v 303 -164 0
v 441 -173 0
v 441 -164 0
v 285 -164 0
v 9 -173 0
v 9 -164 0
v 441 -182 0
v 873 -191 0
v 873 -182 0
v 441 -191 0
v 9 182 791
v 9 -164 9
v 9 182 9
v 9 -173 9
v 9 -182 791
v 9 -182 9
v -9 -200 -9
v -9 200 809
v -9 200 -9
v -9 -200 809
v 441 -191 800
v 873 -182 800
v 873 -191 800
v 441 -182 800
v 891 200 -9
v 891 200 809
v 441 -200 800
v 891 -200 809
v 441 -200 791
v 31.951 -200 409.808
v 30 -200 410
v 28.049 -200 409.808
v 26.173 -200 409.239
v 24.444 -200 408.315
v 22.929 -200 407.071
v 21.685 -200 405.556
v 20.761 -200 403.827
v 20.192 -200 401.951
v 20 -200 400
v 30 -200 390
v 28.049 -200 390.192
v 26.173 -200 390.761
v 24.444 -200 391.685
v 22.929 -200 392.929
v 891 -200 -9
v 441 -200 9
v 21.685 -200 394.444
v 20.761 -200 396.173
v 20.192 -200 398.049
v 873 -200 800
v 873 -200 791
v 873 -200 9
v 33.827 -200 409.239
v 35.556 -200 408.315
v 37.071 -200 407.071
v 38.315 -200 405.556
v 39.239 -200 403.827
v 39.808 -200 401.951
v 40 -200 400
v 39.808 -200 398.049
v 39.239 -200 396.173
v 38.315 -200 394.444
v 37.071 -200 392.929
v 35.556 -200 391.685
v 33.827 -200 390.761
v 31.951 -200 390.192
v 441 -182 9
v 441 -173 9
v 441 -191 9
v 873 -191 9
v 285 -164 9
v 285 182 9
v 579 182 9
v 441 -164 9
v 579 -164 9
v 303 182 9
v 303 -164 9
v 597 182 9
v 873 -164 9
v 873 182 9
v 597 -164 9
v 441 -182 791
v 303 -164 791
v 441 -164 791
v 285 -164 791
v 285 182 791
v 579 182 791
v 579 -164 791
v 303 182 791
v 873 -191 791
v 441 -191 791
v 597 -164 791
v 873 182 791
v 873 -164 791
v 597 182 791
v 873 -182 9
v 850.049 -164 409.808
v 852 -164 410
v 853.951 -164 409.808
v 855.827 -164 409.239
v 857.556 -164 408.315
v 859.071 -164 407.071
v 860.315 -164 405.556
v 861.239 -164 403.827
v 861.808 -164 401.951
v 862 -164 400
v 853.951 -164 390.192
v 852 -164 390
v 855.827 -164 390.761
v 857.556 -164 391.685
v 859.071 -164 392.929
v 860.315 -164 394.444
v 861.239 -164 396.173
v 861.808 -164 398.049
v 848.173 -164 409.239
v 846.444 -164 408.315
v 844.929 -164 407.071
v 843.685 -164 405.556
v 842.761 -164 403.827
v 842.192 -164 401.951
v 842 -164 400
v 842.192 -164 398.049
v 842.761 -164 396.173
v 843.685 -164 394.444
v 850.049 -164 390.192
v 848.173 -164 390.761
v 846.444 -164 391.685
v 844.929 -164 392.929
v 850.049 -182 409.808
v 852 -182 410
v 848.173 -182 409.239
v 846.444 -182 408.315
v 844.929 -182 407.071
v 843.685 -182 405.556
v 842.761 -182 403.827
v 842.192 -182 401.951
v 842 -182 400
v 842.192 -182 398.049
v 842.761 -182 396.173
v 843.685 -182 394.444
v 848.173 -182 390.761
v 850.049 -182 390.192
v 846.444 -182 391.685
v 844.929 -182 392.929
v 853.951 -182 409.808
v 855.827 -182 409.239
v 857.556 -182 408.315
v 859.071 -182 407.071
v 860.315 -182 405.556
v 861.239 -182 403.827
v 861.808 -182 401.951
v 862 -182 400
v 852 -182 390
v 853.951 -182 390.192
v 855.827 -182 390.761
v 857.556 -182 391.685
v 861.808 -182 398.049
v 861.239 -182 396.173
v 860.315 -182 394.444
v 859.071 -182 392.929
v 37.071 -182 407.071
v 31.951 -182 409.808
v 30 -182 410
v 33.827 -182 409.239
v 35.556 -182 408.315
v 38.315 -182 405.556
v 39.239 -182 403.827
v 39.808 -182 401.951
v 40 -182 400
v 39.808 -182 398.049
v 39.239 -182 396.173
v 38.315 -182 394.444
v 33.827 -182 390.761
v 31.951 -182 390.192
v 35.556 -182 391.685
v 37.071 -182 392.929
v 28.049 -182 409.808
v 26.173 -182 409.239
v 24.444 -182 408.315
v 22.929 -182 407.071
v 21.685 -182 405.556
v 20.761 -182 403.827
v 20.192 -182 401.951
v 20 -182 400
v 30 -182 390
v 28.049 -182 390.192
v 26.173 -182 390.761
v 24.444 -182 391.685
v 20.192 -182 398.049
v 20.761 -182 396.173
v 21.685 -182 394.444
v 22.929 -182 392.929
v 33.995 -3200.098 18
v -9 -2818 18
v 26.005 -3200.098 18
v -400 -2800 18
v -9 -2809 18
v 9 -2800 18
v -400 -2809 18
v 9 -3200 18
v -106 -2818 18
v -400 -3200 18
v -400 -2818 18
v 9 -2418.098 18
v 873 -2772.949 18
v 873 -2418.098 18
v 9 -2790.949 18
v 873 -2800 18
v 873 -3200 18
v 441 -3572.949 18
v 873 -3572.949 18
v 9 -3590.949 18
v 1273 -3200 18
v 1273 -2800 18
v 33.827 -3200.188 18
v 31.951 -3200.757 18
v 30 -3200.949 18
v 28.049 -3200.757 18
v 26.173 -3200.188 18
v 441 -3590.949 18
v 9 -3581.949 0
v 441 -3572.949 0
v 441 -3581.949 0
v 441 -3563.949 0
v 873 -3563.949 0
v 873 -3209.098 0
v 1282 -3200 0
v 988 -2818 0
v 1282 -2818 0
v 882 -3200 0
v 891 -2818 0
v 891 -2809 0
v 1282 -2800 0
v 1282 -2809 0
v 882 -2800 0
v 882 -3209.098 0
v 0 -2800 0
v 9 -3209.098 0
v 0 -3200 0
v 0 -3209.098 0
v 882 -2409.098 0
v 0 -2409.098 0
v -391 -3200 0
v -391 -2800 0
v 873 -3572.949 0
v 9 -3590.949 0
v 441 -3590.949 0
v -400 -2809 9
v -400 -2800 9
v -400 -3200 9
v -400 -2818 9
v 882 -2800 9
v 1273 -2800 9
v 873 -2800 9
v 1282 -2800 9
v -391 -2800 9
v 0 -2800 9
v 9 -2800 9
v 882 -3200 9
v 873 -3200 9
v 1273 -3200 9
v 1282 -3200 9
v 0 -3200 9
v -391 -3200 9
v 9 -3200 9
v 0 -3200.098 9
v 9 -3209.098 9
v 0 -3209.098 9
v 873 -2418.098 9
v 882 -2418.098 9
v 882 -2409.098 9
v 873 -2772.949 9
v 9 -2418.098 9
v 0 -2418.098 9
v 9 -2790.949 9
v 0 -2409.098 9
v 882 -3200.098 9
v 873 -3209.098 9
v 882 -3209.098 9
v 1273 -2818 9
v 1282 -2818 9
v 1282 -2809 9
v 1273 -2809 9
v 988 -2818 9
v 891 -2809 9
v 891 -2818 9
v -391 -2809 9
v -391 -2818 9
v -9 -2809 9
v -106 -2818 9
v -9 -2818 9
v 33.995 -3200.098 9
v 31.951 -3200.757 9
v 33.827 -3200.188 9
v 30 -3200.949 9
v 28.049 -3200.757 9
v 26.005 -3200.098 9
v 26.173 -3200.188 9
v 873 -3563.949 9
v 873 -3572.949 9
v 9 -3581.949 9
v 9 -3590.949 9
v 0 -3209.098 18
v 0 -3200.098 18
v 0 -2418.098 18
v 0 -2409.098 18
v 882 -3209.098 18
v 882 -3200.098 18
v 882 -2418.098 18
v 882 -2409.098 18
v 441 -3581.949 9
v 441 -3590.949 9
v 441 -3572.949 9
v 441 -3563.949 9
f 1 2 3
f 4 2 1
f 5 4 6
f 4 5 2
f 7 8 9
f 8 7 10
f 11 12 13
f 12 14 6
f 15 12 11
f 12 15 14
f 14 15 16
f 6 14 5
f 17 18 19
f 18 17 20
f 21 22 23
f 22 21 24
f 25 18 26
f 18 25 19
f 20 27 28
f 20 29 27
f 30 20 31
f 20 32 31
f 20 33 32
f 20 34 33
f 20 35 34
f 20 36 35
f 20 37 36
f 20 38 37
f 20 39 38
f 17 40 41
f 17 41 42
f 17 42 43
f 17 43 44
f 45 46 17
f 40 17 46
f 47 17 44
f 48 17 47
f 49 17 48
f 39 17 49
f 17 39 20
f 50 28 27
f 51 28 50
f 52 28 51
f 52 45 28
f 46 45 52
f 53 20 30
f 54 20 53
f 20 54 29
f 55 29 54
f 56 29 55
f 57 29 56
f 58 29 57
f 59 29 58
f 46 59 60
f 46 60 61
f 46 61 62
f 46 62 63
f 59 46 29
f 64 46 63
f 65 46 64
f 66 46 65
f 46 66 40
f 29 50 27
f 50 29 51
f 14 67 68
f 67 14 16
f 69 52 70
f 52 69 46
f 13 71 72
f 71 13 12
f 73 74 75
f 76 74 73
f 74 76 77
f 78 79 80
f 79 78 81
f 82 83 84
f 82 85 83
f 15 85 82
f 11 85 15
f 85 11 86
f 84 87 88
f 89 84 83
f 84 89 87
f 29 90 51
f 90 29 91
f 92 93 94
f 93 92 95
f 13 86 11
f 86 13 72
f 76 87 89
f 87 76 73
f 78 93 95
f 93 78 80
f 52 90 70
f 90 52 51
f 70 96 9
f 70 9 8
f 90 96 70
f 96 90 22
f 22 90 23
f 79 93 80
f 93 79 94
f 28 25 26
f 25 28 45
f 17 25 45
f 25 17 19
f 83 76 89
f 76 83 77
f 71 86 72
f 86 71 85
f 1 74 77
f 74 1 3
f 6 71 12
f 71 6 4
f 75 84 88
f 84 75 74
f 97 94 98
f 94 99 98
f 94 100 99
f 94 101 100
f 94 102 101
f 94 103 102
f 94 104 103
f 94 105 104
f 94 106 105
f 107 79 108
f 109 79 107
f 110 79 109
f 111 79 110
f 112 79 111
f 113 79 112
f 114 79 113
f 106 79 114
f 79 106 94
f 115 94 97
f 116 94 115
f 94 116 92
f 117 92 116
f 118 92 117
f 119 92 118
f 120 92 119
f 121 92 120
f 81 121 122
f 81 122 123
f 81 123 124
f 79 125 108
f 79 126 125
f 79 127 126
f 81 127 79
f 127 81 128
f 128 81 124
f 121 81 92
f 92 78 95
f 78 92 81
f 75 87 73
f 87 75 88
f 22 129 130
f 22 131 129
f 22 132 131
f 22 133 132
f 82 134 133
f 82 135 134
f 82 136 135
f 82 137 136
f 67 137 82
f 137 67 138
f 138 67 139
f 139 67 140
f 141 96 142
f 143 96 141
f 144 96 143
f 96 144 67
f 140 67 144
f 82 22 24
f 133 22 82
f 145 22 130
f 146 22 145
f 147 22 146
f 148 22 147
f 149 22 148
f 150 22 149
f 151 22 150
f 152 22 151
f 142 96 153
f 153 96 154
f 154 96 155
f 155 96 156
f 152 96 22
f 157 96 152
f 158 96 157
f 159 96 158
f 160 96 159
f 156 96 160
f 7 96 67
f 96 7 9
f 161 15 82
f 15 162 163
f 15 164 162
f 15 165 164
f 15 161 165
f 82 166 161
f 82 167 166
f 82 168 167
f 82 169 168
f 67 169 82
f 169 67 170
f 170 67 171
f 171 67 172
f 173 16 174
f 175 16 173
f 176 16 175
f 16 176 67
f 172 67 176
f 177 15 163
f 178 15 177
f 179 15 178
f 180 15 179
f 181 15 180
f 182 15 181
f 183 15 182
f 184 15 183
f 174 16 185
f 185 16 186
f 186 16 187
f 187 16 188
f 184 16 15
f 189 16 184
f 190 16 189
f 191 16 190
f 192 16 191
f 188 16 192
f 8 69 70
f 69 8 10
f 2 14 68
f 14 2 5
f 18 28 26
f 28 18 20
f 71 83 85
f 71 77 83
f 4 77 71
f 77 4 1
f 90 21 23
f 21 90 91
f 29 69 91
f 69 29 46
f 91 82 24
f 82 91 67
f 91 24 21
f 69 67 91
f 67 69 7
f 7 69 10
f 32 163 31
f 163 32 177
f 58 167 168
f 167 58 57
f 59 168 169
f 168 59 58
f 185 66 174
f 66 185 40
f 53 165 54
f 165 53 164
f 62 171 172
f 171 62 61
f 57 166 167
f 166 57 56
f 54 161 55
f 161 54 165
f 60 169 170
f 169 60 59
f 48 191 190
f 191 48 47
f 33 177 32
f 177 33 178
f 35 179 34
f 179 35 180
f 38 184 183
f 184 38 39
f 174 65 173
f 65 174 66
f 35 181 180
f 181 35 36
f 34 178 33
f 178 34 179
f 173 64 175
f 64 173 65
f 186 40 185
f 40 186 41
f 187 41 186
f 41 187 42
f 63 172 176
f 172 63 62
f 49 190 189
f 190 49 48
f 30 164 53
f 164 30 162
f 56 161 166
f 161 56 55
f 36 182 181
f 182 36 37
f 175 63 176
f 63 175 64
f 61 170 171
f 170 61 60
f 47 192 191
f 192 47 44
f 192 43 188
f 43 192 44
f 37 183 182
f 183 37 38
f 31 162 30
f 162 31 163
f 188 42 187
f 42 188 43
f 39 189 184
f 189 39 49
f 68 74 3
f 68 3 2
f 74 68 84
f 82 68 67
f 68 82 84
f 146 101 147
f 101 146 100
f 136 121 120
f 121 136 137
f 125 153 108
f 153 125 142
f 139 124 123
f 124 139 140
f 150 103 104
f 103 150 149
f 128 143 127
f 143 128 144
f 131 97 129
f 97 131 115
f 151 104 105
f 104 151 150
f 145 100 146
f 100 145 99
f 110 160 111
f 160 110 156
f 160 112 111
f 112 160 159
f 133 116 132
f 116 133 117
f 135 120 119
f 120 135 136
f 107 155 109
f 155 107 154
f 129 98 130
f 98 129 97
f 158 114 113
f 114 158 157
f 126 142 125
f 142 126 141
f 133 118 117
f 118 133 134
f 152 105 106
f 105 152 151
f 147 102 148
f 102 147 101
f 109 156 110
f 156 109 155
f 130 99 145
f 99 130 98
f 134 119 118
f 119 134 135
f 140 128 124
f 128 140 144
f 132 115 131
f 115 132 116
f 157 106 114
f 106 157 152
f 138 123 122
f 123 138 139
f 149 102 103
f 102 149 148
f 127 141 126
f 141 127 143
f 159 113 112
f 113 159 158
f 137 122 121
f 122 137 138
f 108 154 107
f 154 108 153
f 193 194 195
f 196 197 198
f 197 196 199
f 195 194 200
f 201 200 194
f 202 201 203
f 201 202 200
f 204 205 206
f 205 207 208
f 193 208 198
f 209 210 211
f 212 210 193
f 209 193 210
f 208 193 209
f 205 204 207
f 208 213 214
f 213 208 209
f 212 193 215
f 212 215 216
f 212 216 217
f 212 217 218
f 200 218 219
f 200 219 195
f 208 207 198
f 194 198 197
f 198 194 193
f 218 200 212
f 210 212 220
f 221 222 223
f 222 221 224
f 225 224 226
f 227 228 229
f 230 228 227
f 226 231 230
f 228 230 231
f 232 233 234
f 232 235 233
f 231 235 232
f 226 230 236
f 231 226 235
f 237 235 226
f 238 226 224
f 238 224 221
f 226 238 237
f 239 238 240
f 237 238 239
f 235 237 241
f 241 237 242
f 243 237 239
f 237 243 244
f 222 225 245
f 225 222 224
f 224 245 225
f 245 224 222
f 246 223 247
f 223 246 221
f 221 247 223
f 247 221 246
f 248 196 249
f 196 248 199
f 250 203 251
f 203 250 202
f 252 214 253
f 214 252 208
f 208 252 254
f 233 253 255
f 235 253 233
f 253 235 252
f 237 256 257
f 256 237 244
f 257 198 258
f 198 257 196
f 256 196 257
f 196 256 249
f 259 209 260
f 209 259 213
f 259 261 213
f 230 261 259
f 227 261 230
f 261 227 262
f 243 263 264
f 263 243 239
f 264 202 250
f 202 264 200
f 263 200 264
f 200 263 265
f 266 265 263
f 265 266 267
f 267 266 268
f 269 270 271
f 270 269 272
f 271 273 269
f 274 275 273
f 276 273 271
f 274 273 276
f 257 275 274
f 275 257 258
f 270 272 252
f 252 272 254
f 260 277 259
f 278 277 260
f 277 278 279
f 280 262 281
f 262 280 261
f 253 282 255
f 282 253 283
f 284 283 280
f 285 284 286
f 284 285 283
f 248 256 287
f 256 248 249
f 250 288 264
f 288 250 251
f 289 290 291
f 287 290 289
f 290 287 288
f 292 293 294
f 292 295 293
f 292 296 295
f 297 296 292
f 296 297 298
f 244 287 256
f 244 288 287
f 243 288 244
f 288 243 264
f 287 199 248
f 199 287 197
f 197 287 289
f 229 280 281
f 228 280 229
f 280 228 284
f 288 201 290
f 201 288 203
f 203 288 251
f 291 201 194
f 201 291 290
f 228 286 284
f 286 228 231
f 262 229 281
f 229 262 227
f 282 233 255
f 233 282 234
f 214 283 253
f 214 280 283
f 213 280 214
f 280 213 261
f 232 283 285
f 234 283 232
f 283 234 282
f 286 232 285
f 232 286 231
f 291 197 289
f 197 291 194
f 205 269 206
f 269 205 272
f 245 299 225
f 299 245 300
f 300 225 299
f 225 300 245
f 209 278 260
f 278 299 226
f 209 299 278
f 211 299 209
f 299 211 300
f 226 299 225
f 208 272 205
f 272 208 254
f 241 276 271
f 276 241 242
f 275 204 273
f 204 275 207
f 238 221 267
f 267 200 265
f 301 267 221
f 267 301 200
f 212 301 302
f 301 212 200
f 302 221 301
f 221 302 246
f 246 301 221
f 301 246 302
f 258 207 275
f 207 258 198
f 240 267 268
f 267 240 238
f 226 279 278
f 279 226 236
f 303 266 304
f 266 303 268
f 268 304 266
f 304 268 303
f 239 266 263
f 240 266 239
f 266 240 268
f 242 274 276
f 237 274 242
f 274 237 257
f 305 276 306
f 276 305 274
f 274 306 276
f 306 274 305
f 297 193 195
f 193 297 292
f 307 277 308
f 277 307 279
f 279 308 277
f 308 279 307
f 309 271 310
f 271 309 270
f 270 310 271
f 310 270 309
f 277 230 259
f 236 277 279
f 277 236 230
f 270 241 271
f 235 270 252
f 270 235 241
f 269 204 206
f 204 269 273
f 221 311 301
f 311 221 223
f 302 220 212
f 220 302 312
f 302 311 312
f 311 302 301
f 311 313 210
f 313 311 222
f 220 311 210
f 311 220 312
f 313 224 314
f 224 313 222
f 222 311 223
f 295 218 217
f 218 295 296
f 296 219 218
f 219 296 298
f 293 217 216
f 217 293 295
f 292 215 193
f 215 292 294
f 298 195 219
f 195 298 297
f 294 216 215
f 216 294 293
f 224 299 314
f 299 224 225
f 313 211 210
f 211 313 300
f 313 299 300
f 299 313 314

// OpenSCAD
// Archiyou -> OpenSCAD  |  script: slidercabinet  |  units: mm
// OpenSCAD has no units: coordinates are in mm.
// Parts: 18 CSG, 0 baked, 0 2D
// Skipped: gridVLineStart1 (open curve), gridVLineStart2 (open curve), gridVLineStart3 (open curve), gridVLineStart4 (open curve)
// Parameters at export, for reference only (nothing in this file is linked to them):
//   WIDTH = 900
//   HEIGHT = 800
//   DIVIDERS = 2
//   SLIDER_DOOR_OPEN = 0

$fn = 32;
PART = "";

// pleft  (layer frame)
module pleft() {
    color([1, 0, 0]) difference() {
        multmatrix([[0, 0, 1, 0], [0, 1, 0, 0], [-1, 0, 0, 400], [0, 0, 0, 1]]) cube([800, 400, 18], center = true);
        translate([-4.5, 0, 4.5]) cube([9, 400, 9], center = true);
        translate([-4.5, 0, 795.5]) cube([9, 400, 9], center = true);
        translate([441, 186.5, 400]) cube([882, 9, 800], center = true);
    }
}

// pright  (layer frame)
module pright() {
    color([1, 0, 0]) difference() {
        multmatrix([[0, 0, -1, 882], [0, 1, 0, 0], [-1, 0, 0, 400], [0, 0, 0, 1]]) cube([800, 400, 18], center = true);
        multmatrix([[-1, 0, 0, 886.5], [0, 1, 0, 0], [0, 0, 1, 4.5], [0, 0, 0, 1]]) cube([9, 400, 9], center = true);
        multmatrix([[-1, 0, 0, 886.5], [0, 1, 0, 0], [0, 0, 1, 795.5], [0, 0, 0, 1]]) cube([9, 400, 9], center = true);
        translate([441, 186.5, 400]) cube([882, 9, 800], center = true);
    }
}

// pbottom  (layer frame)
module pbottom() {
    color([1, 0, 0]) difference() {
        translate([441, 0, 0]) cube([900, 400, 18], center = true);
        translate([4.5, 0, 4.5]) cube([9, 400, 9], center = true);
        multmatrix([[-1, 0, 0, 877.5], [0, 1, 0, 0], [0, 0, 1, 4.5], [0, 0, 0, 1]]) cube([9, 400, 9], center = true);
        translate([294, 9, 400]) cube([18, 346, 800], center = true);
        translate([588, 9, 400]) cube([18, 346, 800], center = true);
        translate([441, 186.5, 400]) cube([882, 9, 800], center = true);
        translate([441, -186.5, 400]) cube([864, 9, 800], center = true);
        translate([441, -168.5, 400]) cube([864, 9, 800], center = true);
    }
}

// ptop  (layer frame)
module ptop() {
    color([1, 0, 0]) difference() {
        multmatrix([[1, 0, 0, 441], [0, 1, 0, 0], [0, 0, -1, 800], [0, 0, 0, 1]]) cube([900, 400, 18], center = true);
        multmatrix([[1, 0, 0, 4.5], [0, 1, 0, 0], [0, 0, -1, 795.5], [0, 0, 0, 1]]) cube([9, 400, 9], center = true);
        multmatrix([[-1, 0, 0, 877.5], [0, 1, 0, 0], [0, 0, -1, 795.5], [0, 0, 0, 1]]) cube([9, 400, 9], center = true);
        translate([294, 9, 400]) cube([18, 346, 800], center = true);
        translate([588, 9, 400]) cube([18, 346, 800], center = true);
        translate([441, 186.5, 400]) cube([882, 9, 800], center = true);
        translate([441, -186.5, 400]) cube([864, 9, 800], center = true);
        translate([441, -204.5, 400]) cube([864, 9, 800], center = true);
    }
}

// vDivider1  (layer dividers)
module vDivider1() {
    color([0, 0.502, 0]) translate([294, 9, 400]) cube([18, 346, 800], center = true);
}

// vDivider2  (layer dividers)
module vDivider2() {
    color([0, 0.502, 0]) translate([588, 9, 400]) cube([18, 346, 800], center = true);
}

// backplate  (layer backplate)
module backplate() {
    color([0.647, 0.165, 0.165]) difference() {
        translate([441, 191, 400]) cube([882, 18, 800], center = true);
        difference() {
            multmatrix([[0, 0, 1, 0], [0, 1, 0, 0], [-1, 0, 0, 400], [0, 0, 0, 1]]) cube([800, 400, 18], center = true);
            translate([-4.5, 0, 4.5]) cube([9, 400, 9], center = true);
            translate([-4.5, 0, 795.5]) cube([9, 400, 9], center = true);
            translate([441, 186.5, 400]) cube([882, 9, 800], center = true);
        }
        difference() {
            multmatrix([[1, 0, 0, 441], [0, 1, 0, 0], [0, 0, -1, 800], [0, 0, 0, 1]]) cube([900, 400, 18], center = true);
            multmatrix([[1, 0, 0, 4.5], [0, 1, 0, 0], [0, 0, -1, 795.5], [0, 0, 0, 1]]) cube([9, 400, 9], center = true);
            multmatrix([[-1, 0, 0, 877.5], [0, 1, 0, 0], [0, 0, -1, 795.5], [0, 0, 0, 1]]) cube([9, 400, 9], center = true);
            translate([294, 9, 400]) cube([18, 346, 800], center = true);
            translate([588, 9, 400]) cube([18, 346, 800], center = true);
            translate([441, 186.5, 400]) cube([882, 9, 800], center = true);
        }
        difference() {
            multmatrix([[0, 0, -1, 882], [0, 1, 0, 0], [-1, 0, 0, 400], [0, 0, 0, 1]]) cube([800, 400, 18], center = true);
            multmatrix([[-1, 0, 0, 886.5], [0, 1, 0, 0], [0, 0, 1, 4.5], [0, 0, 0, 1]]) cube([9, 400, 9], center = true);
            multmatrix([[-1, 0, 0, 886.5], [0, 1, 0, 0], [0, 0, 1, 795.5], [0, 0, 0, 1]]) cube([9, 400, 9], center = true);
            translate([441, 186.5, 400]) cube([882, 9, 800], center = true);
        }
        difference() {
            translate([441, 0, 0]) cube([900, 400, 18], center = true);
            translate([4.5, 0, 4.5]) cube([9, 400, 9], center = true);
            multmatrix([[-1, 0, 0, 877.5], [0, 1, 0, 0], [0, 0, 1, 4.5], [0, 0, 0, 1]]) cube([9, 400, 9], center = true);
            translate([294, 9, 400]) cube([18, 346, 800], center = true);
            translate([588, 9, 400]) cube([18, 346, 800], center = true);
            translate([441, 186.5, 400]) cube([882, 9, 800], center = true);
        }
    }
}

// sliderDoorLeft  (layer sliderdoors)
module sliderDoorLeft() {
    color([0.502, 0, 0.502]) difference() {
        translate([225, -191, 400]) cube([432, 18, 800], center = true);
        difference() {
            translate([441, 0, 0]) cube([900, 400, 18], center = true);
            translate([4.5, 0, 4.5]) cube([9, 400, 9], center = true);
            multmatrix([[-1, 0, 0, 877.5], [0, 1, 0, 0], [0, 0, 1, 4.5], [0, 0, 0, 1]]) cube([9, 400, 9], center = true);
            translate([294, 9, 400]) cube([18, 346, 800], center = true);
            translate([588, 9, 400]) cube([18, 346, 800], center = true);
            translate([441, 186.5, 400]) cube([882, 9, 800], center = true);
            translate([441, -186.5, 400]) cube([864, 9, 800], center = true);
            translate([441, -168.5, 400]) cube([864, 9, 800], center = true);
        }
        difference() {
            multmatrix([[1, 0, 0, 441], [0, 1, 0, 0], [0, 0, -1, 800], [0, 0, 0, 1]]) cube([900, 400, 18], center = true);
            multmatrix([[1, 0, 0, 4.5], [0, 1, 0, 0], [0, 0, -1, 795.5], [0, 0, 0, 1]]) cube([9, 400, 9], center = true);
            multmatrix([[-1, 0, 0, 877.5], [0, 1, 0, 0], [0, 0, -1, 795.5], [0, 0, 0, 1]]) cube([9, 400, 9], center = true);
            translate([294, 9, 400]) cube([18, 346, 800], center = true);
            translate([588, 9, 400]) cube([18, 346, 800], center = true);
            translate([441, 186.5, 400]) cube([882, 9, 800], center = true);
            translate([441, -186.5, 400]) cube([864, 9, 800], center = true);
            translate([441, -204.5, 400]) cube([864, 9, 800], center = true);
        }
        multmatrix([[1, 0, 0, 30], [0, 0, -1, -150], [0, 1, 0, 400], [0, 0, 0, 1]]) cylinder(h = 100, r = 10);
    }
}

// sliderDoorRight  (layer sliderdoors)
module sliderDoorRight() {
    color([0.502, 0, 0.502]) difference() {
        multmatrix([[-1, 0, 0, 657], [0, 1, 0, -173], [0, 0, 1, 400], [0, 0, 0, 1]]) cube([432, 18, 800], center = true);
        difference() {
            multmatrix([[-1, 0, 0, 441], [0, 1, 0, 18], [0, 0, 1, 0], [0, 0, 0, 1]]) cube([900, 400, 18], center = true);
            multmatrix([[-1, 0, 0, 877.5], [0, 1, 0, 18], [0, 0, 1, 4.5], [0, 0, 0, 1]]) cube([9, 400, 9], center = true);
            translate([4.5, 18, 4.5]) cube([9, 400, 9], center = true);
            multmatrix([[-1, 0, 0, 588], [0, 1, 0, 27], [0, 0, 1, 400], [0, 0, 0, 1]]) cube([18, 346, 800], center = true);
            multmatrix([[-1, 0, 0, 294], [0, 1, 0, 27], [0, 0, 1, 400], [0, 0, 0, 1]]) cube([18, 346, 800], center = true);
            multmatrix([[-1, 0, 0, 441], [0, 1, 0, 204.5], [0, 0, 1, 400], [0, 0, 0, 1]]) cube([882, 9, 800], center = true);
            multmatrix([[-1, 0, 0, 441], [0, 1, 0, -168.5], [0, 0, 1, 400], [0, 0, 0, 1]]) cube([864, 9, 800], center = true);
            multmatrix([[-1, 0, 0, 441], [0, 1, 0, -150.5], [0, 0, 1, 400], [0, 0, 0, 1]]) cube([864, 9, 800], center = true);
        }
        difference() {
            multmatrix([[-1, 0, 0, 441], [0, 1, 0, 18], [0, 0, -1, 800], [0, 0, 0, 1]]) cube([900, 400, 18], center = true);
            multmatrix([[-1, 0, 0, 877.5], [0, 1, 0, 18], [0, 0, -1, 795.5], [0, 0, 0, 1]]) cube([9, 400, 9], center = true);
            multmatrix([[1, 0, 0, 4.5], [0, 1, 0, 18], [0, 0, -1, 795.5], [0, 0, 0, 1]]) cube([9, 400, 9], center = true);
            multmatrix([[-1, 0, 0, 588], [0, 1, 0, 27], [0, 0, 1, 400], [0, 0, 0, 1]]) cube([18, 346, 800], center = true);
            multmatrix([[-1, 0, 0, 294], [0, 1, 0, 27], [0, 0, 1, 400], [0, 0, 0, 1]]) cube([18, 346, 800], center = true);
            multmatrix([[-1, 0, 0, 441], [0, 1, 0, 204.5], [0, 0, 1, 400], [0, 0, 0, 1]]) cube([882, 9, 800], center = true);
            multmatrix([[-1, 0, 0, 441], [0, 1, 0, -168.5], [0, 0, 1, 400], [0, 0, 0, 1]]) cube([864, 9, 800], center = true);
            multmatrix([[-1, 0, 0, 441], [0, 1, 0, -186.5], [0, 0, 1, 400], [0, 0, 0, 1]]) cube([864, 9, 800], center = true);
        }
        multmatrix([[-1, 0, 0, 852], [0, 0, -1, -132], [0, 1, 0, 400], [0, 0, 0, 1]]) cylinder(h = 100, r = 10);
    }
}

// pleft  (layer sliderdoors)
module pleft_2() {
    color([0.502, 0, 0.502]) difference() {
        translate([0, -3000, 9]) cube([800, 400, 18], center = true);
        multmatrix([[0, 0, -1, 395.5], [0, 1, 0, -3000], [1, 0, 0, 4.5], [0, 0, 0, 1]]) cube([9, 400, 9], center = true);
        multmatrix([[0, 0, -1, -395.5], [0, 1, 0, -3000], [1, 0, 0, 4.5], [0, 0, 0, 1]]) cube([9, 400, 9], center = true);
        multmatrix([[0, 0, -1, 0], [0, 1, 0, -2813.5], [1, 0, 0, 450], [0, 0, 0, 1]]) cube([882, 9, 800], center = true);
    }
}

// pright  (layer sliderdoors)
module pright_2() {
    color([0.502, 0, 0.502]) difference() {
        multmatrix([[1, 0, 0, 882], [0, 1, 0, -3000], [0, 0, -1, 9], [0, 0, 0, 1]]) cube([800, 400, 18], center = true);
        multmatrix([[0, 0, -1, 1277.5], [0, 1, 0, -3000], [-1, 0, 0, 13.5], [0, 0, 0, 1]]) cube([9, 400, 9], center = true);
        multmatrix([[0, 0, -1, 486.5], [0, 1, 0, -3000], [-1, 0, 0, 13.5], [0, 0, 0, 1]]) cube([9, 400, 9], center = true);
        multmatrix([[0, 0, -1, 882], [0, 1, 0, -2813.5], [1, 0, 0, -432], [0, 0, 0, 1]]) cube([882, 9, 800], center = true);
    }
}

// pbottom  (layer sliderdoors)
module pbottom_2() {
    color([0.502, 0, 0.502]) difference() {
        translate([441, -3000, 9]) cube([900, 400, 18], center = true);
        translate([4.5, -3000, 13.5]) cube([9, 400, 9], center = true);
        multmatrix([[-1, 0, 0, 877.5], [0, 1, 0, -3000], [0, 0, 1, 13.5], [0, 0, 0, 1]]) cube([9, 400, 9], center = true);
        translate([294, -2991, 409]) cube([18, 346, 800], center = true);
        translate([588, -2991, 409]) cube([18, 346, 800], center = true);
        translate([441, -2813.5, 409]) cube([882, 9, 800], center = true);
        translate([441, -3186.5, 409]) cube([864, 9, 800], center = true);
        translate([441, -3168.5, 409]) cube([864, 9, 800], center = true);
    }
}

// ptop  (layer sliderdoors)
module ptop_2() {
    color([0.502, 0, 0.502]) difference() {
        multmatrix([[1, 0, 0, 441], [0, 1, 0, -3000], [0, 0, -1, 9], [0, 0, 0, 1]]) cube([900, 400, 18], center = true);
        multmatrix([[1, 0, 0, 4.5], [0, 1, 0, -3000], [0, 0, -1, 4.5], [0, 0, 0, 1]]) cube([9, 400, 9], center = true);
        multmatrix([[-1, 0, 0, 877.5], [0, 1, 0, -3000], [0, 0, -1, 4.5], [0, 0, 0, 1]]) cube([9, 400, 9], center = true);
        translate([294, -2991, -391]) cube([18, 346, 800], center = true);
        translate([588, -2991, -391]) cube([18, 346, 800], center = true);
        translate([441, -2813.5, -391]) cube([882, 9, 800], center = true);
        translate([441, -3186.5, -391]) cube([864, 9, 800], center = true);
        translate([441, -3204.5, -391]) cube([864, 9, 800], center = true);
    }
}

// vDivider1  (layer sliderdoors)
module vDivider1_2() {
    color([0.502, 0, 0.502]) multmatrix([[0, 0, -1, 294], [0, 1, 0, -2991], [1, 0, 0, 9], [0, 0, 0, 1]]) cube([18, 346, 800], center = true);
}

// vDivider2  (layer sliderdoors)
module vDivider2_2() {
    color([0.502, 0, 0.502]) multmatrix([[0, 0, -1, 588], [0, 1, 0, -2991], [1, 0, 0, 9], [0, 0, 0, 1]]) cube([18, 346, 800], center = true);
}

// backplate  (layer sliderdoors)
module backplate_2() {
    color([0.502, 0, 0.502]) difference() {
        multmatrix([[1, 0, 0, 441], [0, 0, -1, -2809.09758132], [0, 1, 0, 9], [0, 0, 0, 1]]) cube([882, 18, 800], center = true);
        difference() {
            multmatrix([[0, 0, 1, 0], [1, 0, 0, -2809.09758132], [0, 1, 0, -182], [0, 0, 0, 1]]) cube([800, 400, 18], center = true);
            multmatrix([[1, 0, 0, -4.5], [0, 0, -1, -2413.59758132], [0, 1, 0, -182], [0, 0, 0, 1]]) cube([9, 400, 9], center = true);
            multmatrix([[1, 0, 0, -4.5], [0, 0, -1, -3204.59758132], [0, 1, 0, -182], [0, 0, 0, 1]]) cube([9, 400, 9], center = true);
            multmatrix([[1, 0, 0, 441], [0, 0, -1, -2809.09758132], [0, 1, 0, 4.5], [0, 0, 0, 1]]) cube([882, 9, 800], center = true);
        }
        difference() {
            multmatrix([[1, 0, 0, 441], [0, 0, 1, -3209.09758132], [0, 1, 0, -182], [0, 0, 0, 1]]) cube([900, 400, 18], center = true);
            multmatrix([[1, 0, 0, 4.5], [0, 0, 1, -3204.59758132], [0, 1, 0, -182], [0, 0, 0, 1]]) cube([9, 400, 9], center = true);
            multmatrix([[-1, 0, 0, 877.5], [0, 0, 1, -3204.59758132], [0, 1, 0, -182], [0, 0, 0, 1]]) cube([9, 400, 9], center = true);
            multmatrix([[1, 0, 0, 294], [0, 0, -1, -2809.09758132], [0, 1, 0, -173], [0, 0, 0, 1]]) cube([18, 346, 800], center = true);
            multmatrix([[1, 0, 0, 588], [0, 0, -1, -2809.09758132], [0, 1, 0, -173], [0, 0, 0, 1]]) cube([18, 346, 800], center = true);
            multmatrix([[1, 0, 0, 441], [0, 0, -1, -2809.09758132], [0, 1, 0, 4.5], [0, 0, 0, 1]]) cube([882, 9, 800], center = true);
        }
        difference() {
            multmatrix([[0, 0, -1, 882], [1, 0, 0, -2809.09758132], [0, 1, 0, -182], [0, 0, 0, 1]]) cube([800, 400, 18], center = true);
            multmatrix([[-1, 0, 0, 886.5], [0, 0, -1, -2413.59758132], [0, 1, 0, -182], [0, 0, 0, 1]]) cube([9, 400, 9], center = true);
            multmatrix([[-1, 0, 0, 886.5], [0, 0, -1, -3204.59758132], [0, 1, 0, -182], [0, 0, 0, 1]]) cube([9, 400, 9], center = true);
            multmatrix([[1, 0, 0, 441], [0, 0, -1, -2809.09758132], [0, 1, 0, 4.5], [0, 0, 0, 1]]) cube([882, 9, 800], center = true);
        }
        difference() {
            multmatrix([[1, 0, 0, 441], [0, 0, -1, -2409.09758132], [0, 1, 0, -182], [0, 0, 0, 1]]) cube([900, 400, 18], center = true);
            multmatrix([[1, 0, 0, 4.5], [0, 0, -1, -2413.59758132], [0, 1, 0, -182], [0, 0, 0, 1]]) cube([9, 400, 9], center = true);
            multmatrix([[-1, 0, 0, 877.5], [0, 0, -1, -2413.59758132], [0, 1, 0, -182], [0, 0, 0, 1]]) cube([9, 400, 9], center = true);
            multmatrix([[1, 0, 0, 294], [0, 0, -1, -2809.09758132], [0, 1, 0, -173], [0, 0, 0, 1]]) cube([18, 346, 800], center = true);
            multmatrix([[1, 0, 0, 588], [0, 0, -1, -2809.09758132], [0, 1, 0, -173], [0, 0, 0, 1]]) cube([18, 346, 800], center = true);
            multmatrix([[1, 0, 0, 441], [0, 0, -1, -2809.09758132], [0, 1, 0, 4.5], [0, 0, 0, 1]]) cube([882, 9, 800], center = true);
        }
    }
}

// sliderDoorLeft  (layer sliderdoors)
module sliderDoorLeft_2() {
    color([0.502, 0, 0.502]) difference() {
        multmatrix([[1, 0, 0, 225], [0, 0, -1, -3190.94875218], [0, 1, 0, 9], [0, 0, 0, 1]]) cube([432, 18, 800], center = true);
        difference() {
            multmatrix([[1, 0, 0, 441], [0, 0, -1, -2790.94875218], [0, 1, 0, 200], [0, 0, 0, 1]]) cube([900, 400, 18], center = true);
            multmatrix([[1, 0, 0, 4.5], [0, 0, -1, -2795.44875218], [0, 1, 0, 200], [0, 0, 0, 1]]) cube([9, 400, 9], center = true);
            multmatrix([[-1, 0, 0, 877.5], [0, 0, -1, -2795.44875218], [0, 1, 0, 200], [0, 0, 0, 1]]) cube([9, 400, 9], center = true);
            multmatrix([[1, 0, 0, 294], [0, 0, -1, -3190.94875218], [0, 1, 0, 209], [0, 0, 0, 1]]) cube([18, 346, 800], center = true);
            multmatrix([[1, 0, 0, 588], [0, 0, -1, -3190.94875218], [0, 1, 0, 209], [0, 0, 0, 1]]) cube([18, 346, 800], center = true);
            multmatrix([[1, 0, 0, 441], [0, 0, -1, -3190.94875218], [0, 1, 0, 386.5], [0, 0, 0, 1]]) cube([882, 9, 800], center = true);
            multmatrix([[1, 0, 0, 441], [0, 0, -1, -3190.94875218], [0, 1, 0, 13.5], [0, 0, 0, 1]]) cube([864, 9, 800], center = true);
            multmatrix([[1, 0, 0, 441], [0, 0, -1, -3190.94875218], [0, 1, 0, 31.5], [0, 0, 0, 1]]) cube([864, 9, 800], center = true);
        }
        difference() {
            multmatrix([[1, 0, 0, 441], [0, 0, 1, -3590.94875218], [0, 1, 0, 200], [0, 0, 0, 1]]) cube([900, 400, 18], center = true);
            multmatrix([[1, 0, 0, 4.5], [0, 0, 1, -3586.44875218], [0, 1, 0, 200], [0, 0, 0, 1]]) cube([9, 400, 9], center = true);
            multmatrix([[-1, 0, 0, 877.5], [0, 0, 1, -3586.44875218], [0, 1, 0, 200], [0, 0, 0, 1]]) cube([9, 400, 9], center = true);
            multmatrix([[1, 0, 0, 294], [0, 0, -1, -3190.94875218], [0, 1, 0, 209], [0, 0, 0, 1]]) cube([18, 346, 800], center = true);
            multmatrix([[1, 0, 0, 588], [0, 0, -1, -3190.94875218], [0, 1, 0, 209], [0, 0, 0, 1]]) cube([18, 346, 800], center = true);
            multmatrix([[1, 0, 0, 441], [0, 0, -1, -3190.94875218], [0, 1, 0, 386.5], [0, 0, 0, 1]]) cube([882, 9, 800], center = true);
            multmatrix([[1, 0, 0, 441], [0, 0, -1, -3190.94875218], [0, 1, 0, 13.5], [0, 0, 0, 1]]) cube([864, 9, 800], center = true);
            multmatrix([[1, 0, 0, 441], [0, 0, -1, -3190.94875218], [0, 1, 0, -4.5], [0, 0, 0, 1]]) cube([864, 9, 800], center = true);
        }
        multmatrix([[1, 0, 0, 30], [0, -1, 0, -3190.94875218], [0, 0, -1, 50], [0, 0, 0, 1]]) cylinder(h = 100, r = 10);
    }
}

// sliderDoorRight  (layer sliderdoors)
module sliderDoorRight_2() {
    color([0.502, 0, 0.502]) difference() {
        multmatrix([[-1, 0, 0, 657], [0, 0, -1, -3172.94875218], [0, 1, 0, 9], [0, 0, 0, 1]]) cube([432, 18, 800], center = true);
        difference() {
            multmatrix([[-1, 0, 0, 441], [0, 0, -1, -2772.94875218], [0, 1, 0, 200], [0, 0, 0, 1]]) cube([900, 400, 18], center = true);
            multmatrix([[-1, 0, 0, 877.5], [0, 0, -1, -2777.44875218], [0, 1, 0, 200], [0, 0, 0, 1]]) cube([9, 400, 9], center = true);
            multmatrix([[1, 0, 0, 4.5], [0, 0, -1, -2777.44875218], [0, 1, 0, 200], [0, 0, 0, 1]]) cube([9, 400, 9], center = true);
            multmatrix([[-1, 0, 0, 588], [0, 0, -1, -3172.94875218], [0, 1, 0, 209], [0, 0, 0, 1]]) cube([18, 346, 800], center = true);
            multmatrix([[-1, 0, 0, 294], [0, 0, -1, -3172.94875218], [0, 1, 0, 209], [0, 0, 0, 1]]) cube([18, 346, 800], center = true);
            multmatrix([[-1, 0, 0, 441], [0, 0, -1, -3172.94875218], [0, 1, 0, 386.5], [0, 0, 0, 1]]) cube([882, 9, 800], center = true);
            multmatrix([[-1, 0, 0, 441], [0, 0, -1, -3172.94875218], [0, 1, 0, 13.5], [0, 0, 0, 1]]) cube([864, 9, 800], center = true);
            multmatrix([[-1, 0, 0, 441], [0, 0, -1, -3172.94875218], [0, 1, 0, 31.5], [0, 0, 0, 1]]) cube([864, 9, 800], center = true);
        }
        difference() {
            multmatrix([[-1, 0, 0, 441], [0, 0, 1, -3572.94875218], [0, 1, 0, 200], [0, 0, 0, 1]]) cube([900, 400, 18], center = true);
            multmatrix([[-1, 0, 0, 877.5], [0, 0, 1, -3568.44875218], [0, 1, 0, 200], [0, 0, 0, 1]]) cube([9, 400, 9], center = true);
            multmatrix([[1, 0, 0, 4.5], [0, 0, 1, -3568.44875218], [0, 1, 0, 200], [0, 0, 0, 1]]) cube([9, 400, 9], center = true);
            multmatrix([[-1, 0, 0, 588], [0, 0, -1, -3172.94875218], [0, 1, 0, 209], [0, 0, 0, 1]]) cube([18, 346, 800], center = true);
            multmatrix([[-1, 0, 0, 294], [0, 0, -1, -3172.94875218], [0, 1, 0, 209], [0, 0, 0, 1]]) cube([18, 346, 800], center = true);
            multmatrix([[-1, 0, 0, 441], [0, 0, -1, -3172.94875218], [0, 1, 0, 386.5], [0, 0, 0, 1]]) cube([882, 9, 800], center = true);
            multmatrix([[-1, 0, 0, 441], [0, 0, -1, -3172.94875218], [0, 1, 0, 13.5], [0, 0, 0, 1]]) cube([864, 9, 800], center = true);
            multmatrix([[-1, 0, 0, 441], [0, 0, -1, -3172.94875218], [0, 1, 0, -4.5], [0, 0, 0, 1]]) cube([864, 9, 800], center = true);
        }
        multmatrix([[-1, 0, 0, 852], [0, -1, 0, -3172.94875218], [0, 0, -1, 50], [0, 0, 0, 1]]) cylinder(h = 100, r = 10);
    }
}

// 3D parts
if (PART == "" || PART == "pleft") pleft();
if (PART == "" || PART == "pright") pright();
if (PART == "" || PART == "pbottom") pbottom();
if (PART == "" || PART == "ptop") ptop();
if (PART == "" || PART == "vDivider1") vDivider1();
if (PART == "" || PART == "vDivider2") vDivider2();
if (PART == "" || PART == "backplate") backplate();
if (PART == "" || PART == "sliderDoorLeft") sliderDoorLeft();
if (PART == "" || PART == "sliderDoorRight") sliderDoorRight();
if (PART == "" || PART == "pleft_2") pleft_2();
if (PART == "" || PART == "pright_2") pright_2();
if (PART == "" || PART == "pbottom_2") pbottom_2();
if (PART == "" || PART == "ptop_2") ptop_2();
if (PART == "" || PART == "vDivider1_2") vDivider1_2();
if (PART == "" || PART == "vDivider2_2") vDivider2_2();
if (PART == "" || PART == "backplate_2") backplate_2();
if (PART == "" || PART == "sliderDoorLeft_2") sliderDoorLeft_2();
if (PART == "" || PART == "sliderDoorRight_2") sliderDoorRight_2();
